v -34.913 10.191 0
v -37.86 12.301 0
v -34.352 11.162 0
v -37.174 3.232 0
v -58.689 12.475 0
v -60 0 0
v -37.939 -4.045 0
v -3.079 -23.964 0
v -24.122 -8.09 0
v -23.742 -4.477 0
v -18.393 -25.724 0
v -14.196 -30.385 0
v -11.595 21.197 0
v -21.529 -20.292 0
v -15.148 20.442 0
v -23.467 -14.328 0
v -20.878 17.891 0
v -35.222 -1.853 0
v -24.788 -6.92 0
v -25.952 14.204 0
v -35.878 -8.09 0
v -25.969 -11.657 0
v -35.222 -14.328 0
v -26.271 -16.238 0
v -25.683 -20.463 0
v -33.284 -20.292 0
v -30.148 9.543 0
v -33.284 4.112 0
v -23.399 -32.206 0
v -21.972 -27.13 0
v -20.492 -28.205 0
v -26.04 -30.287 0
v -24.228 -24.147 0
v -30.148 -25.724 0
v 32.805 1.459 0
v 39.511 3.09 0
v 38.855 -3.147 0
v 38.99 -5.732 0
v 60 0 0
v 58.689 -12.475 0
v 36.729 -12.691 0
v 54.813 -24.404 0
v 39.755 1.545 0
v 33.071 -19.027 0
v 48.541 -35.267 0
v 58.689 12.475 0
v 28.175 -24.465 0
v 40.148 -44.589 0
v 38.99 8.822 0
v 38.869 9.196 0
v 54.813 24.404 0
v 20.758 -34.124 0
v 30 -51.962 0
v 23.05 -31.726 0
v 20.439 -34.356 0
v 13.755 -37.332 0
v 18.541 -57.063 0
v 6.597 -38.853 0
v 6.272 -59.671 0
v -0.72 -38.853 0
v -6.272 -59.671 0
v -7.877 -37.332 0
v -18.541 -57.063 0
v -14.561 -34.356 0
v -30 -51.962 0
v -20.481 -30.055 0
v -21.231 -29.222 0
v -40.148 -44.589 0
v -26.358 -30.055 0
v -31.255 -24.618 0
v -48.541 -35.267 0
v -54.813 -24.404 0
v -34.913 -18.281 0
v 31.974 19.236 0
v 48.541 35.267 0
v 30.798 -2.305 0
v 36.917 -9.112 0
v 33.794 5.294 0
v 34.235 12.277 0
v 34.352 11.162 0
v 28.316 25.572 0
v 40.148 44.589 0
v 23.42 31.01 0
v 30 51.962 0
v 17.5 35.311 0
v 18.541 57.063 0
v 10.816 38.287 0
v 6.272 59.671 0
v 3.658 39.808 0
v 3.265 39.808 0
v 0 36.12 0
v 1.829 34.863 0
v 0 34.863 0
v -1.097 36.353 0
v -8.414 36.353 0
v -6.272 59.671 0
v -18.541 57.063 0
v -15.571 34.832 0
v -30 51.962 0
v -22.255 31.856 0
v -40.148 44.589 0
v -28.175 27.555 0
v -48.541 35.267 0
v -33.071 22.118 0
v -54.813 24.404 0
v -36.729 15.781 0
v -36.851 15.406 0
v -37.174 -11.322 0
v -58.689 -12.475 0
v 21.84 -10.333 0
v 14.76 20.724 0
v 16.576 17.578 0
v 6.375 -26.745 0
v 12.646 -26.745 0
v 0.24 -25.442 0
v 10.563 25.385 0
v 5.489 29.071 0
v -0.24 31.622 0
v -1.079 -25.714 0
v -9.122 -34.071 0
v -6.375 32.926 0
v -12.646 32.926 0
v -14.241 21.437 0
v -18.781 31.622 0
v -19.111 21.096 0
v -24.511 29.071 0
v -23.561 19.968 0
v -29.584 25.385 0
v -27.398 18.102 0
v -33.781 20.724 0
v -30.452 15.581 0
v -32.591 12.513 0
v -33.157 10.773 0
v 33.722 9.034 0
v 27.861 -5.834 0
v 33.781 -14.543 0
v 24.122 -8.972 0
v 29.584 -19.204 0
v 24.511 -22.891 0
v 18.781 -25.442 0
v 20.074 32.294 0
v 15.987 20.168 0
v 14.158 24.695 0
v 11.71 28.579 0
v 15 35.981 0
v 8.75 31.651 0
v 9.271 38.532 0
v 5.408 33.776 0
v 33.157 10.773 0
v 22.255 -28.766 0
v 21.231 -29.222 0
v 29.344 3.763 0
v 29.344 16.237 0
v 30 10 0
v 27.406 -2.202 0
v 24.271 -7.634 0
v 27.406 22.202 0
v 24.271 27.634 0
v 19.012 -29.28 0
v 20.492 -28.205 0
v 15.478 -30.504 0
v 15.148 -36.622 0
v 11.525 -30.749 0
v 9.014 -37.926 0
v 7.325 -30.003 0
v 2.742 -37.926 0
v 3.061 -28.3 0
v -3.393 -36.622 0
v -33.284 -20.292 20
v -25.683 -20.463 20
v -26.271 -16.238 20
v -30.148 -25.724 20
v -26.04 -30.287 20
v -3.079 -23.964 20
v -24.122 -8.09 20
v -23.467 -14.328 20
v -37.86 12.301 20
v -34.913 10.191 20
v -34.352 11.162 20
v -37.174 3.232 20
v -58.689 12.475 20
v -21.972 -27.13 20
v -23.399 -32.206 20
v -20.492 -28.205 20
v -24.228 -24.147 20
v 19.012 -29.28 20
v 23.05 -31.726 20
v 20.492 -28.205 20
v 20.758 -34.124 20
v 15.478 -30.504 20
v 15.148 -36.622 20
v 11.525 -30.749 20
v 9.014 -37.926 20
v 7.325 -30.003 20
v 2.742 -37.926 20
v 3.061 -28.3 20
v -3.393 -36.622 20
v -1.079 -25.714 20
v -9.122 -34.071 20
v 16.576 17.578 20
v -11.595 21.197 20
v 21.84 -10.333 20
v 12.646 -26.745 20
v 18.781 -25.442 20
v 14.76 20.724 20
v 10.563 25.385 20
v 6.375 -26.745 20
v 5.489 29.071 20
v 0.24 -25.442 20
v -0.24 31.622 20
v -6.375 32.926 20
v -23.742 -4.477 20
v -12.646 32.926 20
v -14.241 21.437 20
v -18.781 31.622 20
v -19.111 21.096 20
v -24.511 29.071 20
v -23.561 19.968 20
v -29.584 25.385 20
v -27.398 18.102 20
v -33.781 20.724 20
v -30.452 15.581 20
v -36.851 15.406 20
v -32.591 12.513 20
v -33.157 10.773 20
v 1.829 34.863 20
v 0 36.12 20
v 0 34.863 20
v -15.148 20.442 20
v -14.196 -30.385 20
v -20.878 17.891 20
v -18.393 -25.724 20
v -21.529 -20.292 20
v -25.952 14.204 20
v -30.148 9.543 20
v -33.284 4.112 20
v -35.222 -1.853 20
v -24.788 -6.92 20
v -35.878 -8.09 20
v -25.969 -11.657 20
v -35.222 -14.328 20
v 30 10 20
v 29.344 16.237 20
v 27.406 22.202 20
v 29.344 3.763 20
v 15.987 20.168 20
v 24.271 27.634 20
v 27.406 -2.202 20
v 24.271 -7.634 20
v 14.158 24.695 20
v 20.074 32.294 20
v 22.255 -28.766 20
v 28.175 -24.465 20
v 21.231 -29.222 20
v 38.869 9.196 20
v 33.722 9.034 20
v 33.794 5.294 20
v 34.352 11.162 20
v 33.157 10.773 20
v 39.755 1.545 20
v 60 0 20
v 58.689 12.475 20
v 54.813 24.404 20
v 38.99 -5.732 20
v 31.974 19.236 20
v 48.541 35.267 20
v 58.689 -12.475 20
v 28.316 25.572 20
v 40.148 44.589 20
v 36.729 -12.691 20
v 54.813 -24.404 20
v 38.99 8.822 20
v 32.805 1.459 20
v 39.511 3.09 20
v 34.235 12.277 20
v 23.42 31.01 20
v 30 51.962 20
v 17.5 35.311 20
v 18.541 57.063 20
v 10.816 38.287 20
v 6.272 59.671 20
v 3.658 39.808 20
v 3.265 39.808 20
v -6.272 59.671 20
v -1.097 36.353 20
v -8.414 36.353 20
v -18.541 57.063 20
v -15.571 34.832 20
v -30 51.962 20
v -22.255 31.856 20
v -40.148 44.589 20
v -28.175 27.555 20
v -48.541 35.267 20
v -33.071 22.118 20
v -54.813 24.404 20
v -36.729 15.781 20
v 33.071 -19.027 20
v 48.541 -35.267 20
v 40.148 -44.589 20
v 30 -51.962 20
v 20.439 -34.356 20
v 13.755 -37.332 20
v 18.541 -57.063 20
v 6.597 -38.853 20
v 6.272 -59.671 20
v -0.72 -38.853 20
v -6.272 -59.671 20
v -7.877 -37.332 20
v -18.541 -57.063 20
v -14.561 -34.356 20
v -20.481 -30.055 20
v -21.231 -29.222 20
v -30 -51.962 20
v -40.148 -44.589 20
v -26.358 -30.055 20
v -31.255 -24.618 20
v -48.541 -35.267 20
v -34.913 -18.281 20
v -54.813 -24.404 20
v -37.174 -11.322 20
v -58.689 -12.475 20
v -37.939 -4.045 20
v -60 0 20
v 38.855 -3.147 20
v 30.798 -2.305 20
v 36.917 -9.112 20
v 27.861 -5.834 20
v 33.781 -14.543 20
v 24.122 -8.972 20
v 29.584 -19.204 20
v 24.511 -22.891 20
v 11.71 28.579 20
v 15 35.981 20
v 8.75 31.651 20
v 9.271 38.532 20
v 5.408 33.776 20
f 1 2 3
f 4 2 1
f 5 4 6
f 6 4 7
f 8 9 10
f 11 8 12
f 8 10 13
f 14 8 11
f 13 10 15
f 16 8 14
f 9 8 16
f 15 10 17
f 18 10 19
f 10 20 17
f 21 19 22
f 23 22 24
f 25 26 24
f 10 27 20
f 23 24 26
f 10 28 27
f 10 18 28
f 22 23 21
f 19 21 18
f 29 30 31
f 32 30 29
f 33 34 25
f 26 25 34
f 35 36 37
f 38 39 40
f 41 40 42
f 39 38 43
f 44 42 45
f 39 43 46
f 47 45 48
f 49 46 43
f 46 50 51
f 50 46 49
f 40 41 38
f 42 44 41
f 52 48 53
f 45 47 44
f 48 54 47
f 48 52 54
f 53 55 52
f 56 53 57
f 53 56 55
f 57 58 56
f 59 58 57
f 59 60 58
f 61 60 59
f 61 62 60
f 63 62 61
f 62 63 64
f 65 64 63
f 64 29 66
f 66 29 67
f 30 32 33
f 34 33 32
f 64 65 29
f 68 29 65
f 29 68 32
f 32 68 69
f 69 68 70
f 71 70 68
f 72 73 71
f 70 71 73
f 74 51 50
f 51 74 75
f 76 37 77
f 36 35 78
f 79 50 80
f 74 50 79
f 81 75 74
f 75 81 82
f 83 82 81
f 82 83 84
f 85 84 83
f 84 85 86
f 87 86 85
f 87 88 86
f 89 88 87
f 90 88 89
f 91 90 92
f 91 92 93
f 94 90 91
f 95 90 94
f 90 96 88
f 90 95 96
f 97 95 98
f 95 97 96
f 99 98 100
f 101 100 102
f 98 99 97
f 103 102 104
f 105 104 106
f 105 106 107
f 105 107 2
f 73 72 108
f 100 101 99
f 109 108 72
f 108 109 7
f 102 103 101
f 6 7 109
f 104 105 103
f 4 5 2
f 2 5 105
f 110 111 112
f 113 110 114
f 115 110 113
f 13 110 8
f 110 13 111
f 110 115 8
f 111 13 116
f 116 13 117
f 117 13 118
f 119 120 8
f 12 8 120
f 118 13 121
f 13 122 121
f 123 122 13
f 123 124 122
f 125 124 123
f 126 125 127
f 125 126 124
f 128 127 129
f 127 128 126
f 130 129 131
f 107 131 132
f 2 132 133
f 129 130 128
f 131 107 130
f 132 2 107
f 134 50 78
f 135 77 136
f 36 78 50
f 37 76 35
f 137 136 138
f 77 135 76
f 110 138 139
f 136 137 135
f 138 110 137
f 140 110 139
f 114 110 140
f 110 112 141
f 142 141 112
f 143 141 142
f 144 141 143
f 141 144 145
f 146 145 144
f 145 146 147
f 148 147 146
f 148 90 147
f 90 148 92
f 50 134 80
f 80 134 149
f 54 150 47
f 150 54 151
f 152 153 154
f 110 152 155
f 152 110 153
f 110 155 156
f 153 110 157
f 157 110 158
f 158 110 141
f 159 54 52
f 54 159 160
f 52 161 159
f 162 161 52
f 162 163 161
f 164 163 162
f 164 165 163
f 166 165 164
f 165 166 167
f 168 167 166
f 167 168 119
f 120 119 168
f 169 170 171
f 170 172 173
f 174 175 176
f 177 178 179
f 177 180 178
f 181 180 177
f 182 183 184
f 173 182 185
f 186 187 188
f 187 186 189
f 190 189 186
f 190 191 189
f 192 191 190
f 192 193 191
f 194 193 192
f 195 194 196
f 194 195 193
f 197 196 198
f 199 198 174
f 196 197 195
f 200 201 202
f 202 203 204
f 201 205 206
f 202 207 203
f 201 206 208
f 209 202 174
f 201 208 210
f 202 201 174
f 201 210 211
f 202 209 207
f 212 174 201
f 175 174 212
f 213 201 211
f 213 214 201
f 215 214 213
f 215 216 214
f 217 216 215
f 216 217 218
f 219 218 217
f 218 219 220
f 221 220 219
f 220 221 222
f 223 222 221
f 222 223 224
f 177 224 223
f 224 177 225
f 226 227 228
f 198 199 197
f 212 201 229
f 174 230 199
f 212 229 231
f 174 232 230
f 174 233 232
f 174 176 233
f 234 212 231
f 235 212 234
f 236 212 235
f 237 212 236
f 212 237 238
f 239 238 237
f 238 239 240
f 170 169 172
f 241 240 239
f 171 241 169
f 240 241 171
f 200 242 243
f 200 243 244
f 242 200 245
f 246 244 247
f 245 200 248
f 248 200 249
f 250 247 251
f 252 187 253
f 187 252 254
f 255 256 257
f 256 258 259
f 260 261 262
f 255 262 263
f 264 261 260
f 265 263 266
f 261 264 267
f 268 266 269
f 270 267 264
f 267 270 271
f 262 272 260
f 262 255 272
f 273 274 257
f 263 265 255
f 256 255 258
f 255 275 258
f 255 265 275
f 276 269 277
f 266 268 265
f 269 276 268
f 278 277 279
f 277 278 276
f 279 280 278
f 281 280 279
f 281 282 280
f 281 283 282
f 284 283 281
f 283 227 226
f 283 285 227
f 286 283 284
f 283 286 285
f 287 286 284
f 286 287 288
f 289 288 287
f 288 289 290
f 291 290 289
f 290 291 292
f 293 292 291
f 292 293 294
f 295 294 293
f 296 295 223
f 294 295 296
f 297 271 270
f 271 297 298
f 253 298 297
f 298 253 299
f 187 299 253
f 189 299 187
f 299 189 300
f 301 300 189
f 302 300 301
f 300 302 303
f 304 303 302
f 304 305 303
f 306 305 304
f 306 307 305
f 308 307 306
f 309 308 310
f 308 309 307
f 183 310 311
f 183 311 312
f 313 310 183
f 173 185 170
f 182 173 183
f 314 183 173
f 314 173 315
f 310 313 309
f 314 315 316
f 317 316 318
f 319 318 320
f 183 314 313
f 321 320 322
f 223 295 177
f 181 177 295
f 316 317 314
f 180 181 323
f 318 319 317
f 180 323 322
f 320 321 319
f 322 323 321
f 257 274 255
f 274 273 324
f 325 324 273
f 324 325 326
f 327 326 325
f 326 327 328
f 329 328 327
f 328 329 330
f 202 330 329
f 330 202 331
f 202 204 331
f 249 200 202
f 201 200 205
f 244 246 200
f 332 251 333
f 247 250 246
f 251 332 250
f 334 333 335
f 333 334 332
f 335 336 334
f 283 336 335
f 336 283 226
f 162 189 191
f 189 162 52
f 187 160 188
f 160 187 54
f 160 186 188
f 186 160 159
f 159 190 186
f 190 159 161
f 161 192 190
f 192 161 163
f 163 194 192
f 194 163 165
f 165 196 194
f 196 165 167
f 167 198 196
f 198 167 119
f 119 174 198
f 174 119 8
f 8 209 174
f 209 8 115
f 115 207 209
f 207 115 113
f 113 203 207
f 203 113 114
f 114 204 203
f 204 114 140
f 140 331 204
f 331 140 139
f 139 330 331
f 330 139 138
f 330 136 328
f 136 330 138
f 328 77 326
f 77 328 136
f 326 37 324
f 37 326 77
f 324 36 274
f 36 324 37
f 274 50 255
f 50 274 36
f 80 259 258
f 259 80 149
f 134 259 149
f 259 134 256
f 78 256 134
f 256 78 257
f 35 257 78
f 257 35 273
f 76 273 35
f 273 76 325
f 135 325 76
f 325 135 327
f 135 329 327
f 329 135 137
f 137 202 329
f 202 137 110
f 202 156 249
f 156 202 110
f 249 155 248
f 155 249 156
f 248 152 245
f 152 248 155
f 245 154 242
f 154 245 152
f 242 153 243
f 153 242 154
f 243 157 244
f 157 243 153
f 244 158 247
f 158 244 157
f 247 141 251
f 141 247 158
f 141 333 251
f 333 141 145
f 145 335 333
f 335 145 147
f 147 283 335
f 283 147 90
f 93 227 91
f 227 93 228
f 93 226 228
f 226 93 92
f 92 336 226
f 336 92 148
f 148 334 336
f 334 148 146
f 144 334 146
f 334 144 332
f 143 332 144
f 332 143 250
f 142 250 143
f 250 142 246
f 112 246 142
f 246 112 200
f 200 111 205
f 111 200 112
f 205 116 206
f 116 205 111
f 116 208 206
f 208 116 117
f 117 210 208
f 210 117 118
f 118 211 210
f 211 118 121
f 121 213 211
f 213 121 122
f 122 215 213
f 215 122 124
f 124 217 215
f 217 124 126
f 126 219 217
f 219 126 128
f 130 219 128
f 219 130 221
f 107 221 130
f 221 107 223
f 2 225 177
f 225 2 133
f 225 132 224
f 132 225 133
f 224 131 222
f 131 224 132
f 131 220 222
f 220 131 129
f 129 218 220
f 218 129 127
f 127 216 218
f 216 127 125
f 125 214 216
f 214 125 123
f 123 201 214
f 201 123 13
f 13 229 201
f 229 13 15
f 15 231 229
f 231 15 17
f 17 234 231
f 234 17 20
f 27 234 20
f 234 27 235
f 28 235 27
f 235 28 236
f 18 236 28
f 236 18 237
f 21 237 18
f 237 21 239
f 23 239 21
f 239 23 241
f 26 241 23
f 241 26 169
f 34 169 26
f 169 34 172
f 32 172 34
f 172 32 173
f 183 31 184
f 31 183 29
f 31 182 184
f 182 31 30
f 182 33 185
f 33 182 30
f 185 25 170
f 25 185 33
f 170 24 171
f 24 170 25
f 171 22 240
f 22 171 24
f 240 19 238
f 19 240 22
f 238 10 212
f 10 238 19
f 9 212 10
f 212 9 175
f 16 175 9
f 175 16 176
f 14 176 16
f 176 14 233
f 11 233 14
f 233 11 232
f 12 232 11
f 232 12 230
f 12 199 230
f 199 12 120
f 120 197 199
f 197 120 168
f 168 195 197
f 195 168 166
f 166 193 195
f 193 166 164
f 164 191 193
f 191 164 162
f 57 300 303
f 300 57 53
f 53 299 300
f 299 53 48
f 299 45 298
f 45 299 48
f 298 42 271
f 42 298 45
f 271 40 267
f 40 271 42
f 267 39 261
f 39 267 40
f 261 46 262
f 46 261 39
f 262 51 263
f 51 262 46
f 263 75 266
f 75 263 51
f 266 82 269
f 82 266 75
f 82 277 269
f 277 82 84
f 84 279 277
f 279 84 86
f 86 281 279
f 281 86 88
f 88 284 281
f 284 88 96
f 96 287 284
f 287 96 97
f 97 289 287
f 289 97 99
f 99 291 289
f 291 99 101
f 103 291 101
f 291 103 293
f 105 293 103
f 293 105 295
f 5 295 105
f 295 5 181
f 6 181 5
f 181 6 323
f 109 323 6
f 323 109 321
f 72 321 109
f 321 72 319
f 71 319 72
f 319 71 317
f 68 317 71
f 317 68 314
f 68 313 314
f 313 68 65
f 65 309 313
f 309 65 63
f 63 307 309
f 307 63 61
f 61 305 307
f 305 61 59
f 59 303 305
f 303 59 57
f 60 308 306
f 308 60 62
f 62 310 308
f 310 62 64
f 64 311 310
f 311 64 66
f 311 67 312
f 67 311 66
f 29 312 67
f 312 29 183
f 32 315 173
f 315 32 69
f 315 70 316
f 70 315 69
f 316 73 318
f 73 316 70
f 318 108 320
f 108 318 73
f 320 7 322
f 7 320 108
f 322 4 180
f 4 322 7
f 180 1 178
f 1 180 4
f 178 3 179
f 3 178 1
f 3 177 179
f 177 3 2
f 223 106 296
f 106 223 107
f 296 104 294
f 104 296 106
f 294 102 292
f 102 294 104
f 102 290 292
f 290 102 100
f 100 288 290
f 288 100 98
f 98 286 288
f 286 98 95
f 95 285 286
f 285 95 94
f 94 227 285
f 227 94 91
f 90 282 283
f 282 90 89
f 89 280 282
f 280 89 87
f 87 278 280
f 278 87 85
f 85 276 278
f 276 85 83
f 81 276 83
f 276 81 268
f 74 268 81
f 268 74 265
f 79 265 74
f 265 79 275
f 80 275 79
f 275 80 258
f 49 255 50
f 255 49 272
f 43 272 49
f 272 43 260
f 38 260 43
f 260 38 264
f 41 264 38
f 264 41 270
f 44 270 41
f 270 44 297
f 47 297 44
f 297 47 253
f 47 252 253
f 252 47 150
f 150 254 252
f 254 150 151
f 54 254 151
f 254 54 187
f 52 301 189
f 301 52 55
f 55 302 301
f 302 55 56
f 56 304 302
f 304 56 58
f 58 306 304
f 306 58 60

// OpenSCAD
//
//  Copyright (C) 05-03-2013 Jasper den Ouden.
//
//  This is free software: you can redistribute it and/or modify
//  it under the terms of the GNU General Public License as published
//  by the Free Software Foundation, either version 3 of the License, or
//  (at your option) any later version.
//

//The whole thing rotates, just the inner part of it rotates if against pressure.
//Useful for instance to allow power springs to be tightened without releasing
// first.

h= 20;

d=5; //Distance pushed in.

ro = 60;
ri = 40;
rd = d;

ra = ri/2;

n = 5;

module cut_base()
{
    for( a= [ 0 : 360/n :360 ] )
    {
        rotate(a=a) translate([0,d]) difference()
        {
            circle(ri-d);
            translate([-ro,0]) square(2*[ro,ro], center=true);
        }
    }
}

module rot_base()
{
    r = (ri+ra)/2;
    circle(ra);
    for( a= [ 0 : 360/n :360 ] )
    {
        rotate(a=a) translate([0,ri-r]) difference()
        {
            circle(r);
            translate([-ro,0]) square(2*[ro,ro], center=true);
            scale([0.7,1]) circle(r-rd);
        }
    }
}
color([1,0,0]) linear_extrude(height=h) rot_base();

linear_extrude(height=h)
difference()
{ 
    circle(ro);
    cut_base();
}
